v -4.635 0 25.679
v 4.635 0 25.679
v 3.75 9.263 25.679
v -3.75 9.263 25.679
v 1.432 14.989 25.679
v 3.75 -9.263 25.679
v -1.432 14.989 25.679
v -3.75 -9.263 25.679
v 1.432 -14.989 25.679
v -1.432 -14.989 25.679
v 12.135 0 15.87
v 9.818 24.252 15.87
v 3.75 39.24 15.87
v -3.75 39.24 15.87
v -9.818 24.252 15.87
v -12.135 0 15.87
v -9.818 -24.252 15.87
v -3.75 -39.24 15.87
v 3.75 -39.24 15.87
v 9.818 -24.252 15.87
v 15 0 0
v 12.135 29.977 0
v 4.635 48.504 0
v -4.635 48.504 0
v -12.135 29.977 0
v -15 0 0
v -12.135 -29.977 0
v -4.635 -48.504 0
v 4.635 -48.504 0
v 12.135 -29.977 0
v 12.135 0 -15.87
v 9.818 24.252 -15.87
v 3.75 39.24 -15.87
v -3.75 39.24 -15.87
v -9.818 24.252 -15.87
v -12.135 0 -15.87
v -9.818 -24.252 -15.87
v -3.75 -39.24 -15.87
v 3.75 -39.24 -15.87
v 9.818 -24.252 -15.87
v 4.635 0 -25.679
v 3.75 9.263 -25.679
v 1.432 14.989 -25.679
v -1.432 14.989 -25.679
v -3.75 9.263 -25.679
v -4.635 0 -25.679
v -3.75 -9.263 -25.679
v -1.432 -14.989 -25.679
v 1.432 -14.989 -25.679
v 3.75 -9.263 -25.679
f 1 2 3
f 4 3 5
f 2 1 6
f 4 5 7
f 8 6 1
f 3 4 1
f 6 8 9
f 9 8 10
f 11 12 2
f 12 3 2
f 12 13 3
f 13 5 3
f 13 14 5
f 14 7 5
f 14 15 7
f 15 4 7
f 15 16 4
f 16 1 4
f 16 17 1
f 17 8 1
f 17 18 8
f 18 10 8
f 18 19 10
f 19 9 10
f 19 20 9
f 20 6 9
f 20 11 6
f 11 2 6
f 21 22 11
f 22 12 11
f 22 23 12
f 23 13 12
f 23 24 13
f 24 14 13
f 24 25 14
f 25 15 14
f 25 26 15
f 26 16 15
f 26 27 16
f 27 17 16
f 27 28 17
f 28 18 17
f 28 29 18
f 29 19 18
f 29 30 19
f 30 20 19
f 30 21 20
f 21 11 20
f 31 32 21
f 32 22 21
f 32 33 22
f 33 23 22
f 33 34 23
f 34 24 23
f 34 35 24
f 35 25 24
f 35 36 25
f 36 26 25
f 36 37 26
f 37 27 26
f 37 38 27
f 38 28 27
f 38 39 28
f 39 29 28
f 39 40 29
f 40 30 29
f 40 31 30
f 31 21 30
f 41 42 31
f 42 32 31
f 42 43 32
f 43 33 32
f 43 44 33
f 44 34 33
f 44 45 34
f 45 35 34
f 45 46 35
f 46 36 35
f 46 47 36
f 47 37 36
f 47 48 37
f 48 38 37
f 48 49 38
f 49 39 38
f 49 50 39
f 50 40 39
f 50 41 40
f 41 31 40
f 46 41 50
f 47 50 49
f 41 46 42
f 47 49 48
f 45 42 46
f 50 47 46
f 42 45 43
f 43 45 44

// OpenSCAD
// Generated by SolidPython 1.0.1 on 2020-07-29 00:46:46


scale(v = [5, 17, 9]) {
	sphere(r = 3);
}
/***********************************************
*********      SolidPython code:      **********
************************************************
 
# import packages: SolidPython
from solid import *
from solid.utils import *
from itertools import chain, combinations, permutations


class Resize:

    def __init__(self, scad_file):
        self.scad_file = scad_file
        #self.scad_file = import_scad(scad_file)
        # cone/cylinder param:
        self.r1 = 0
        self.r2 = 0
        self.h = 0
        # rectangular prism param:
        self.w = 0
        self.l = 0
        # ellipse param:
        self.r = 0

    # import OpenScad code (file name corresponds to shape)


    # classify shape + parameters
    def assign(self, param1, param2, param3):
        if self.scad_file == 'cone.scad':
            self.r1 = param1
            self.r2 = param2
            self.h = param3
        elif self.scad_file == 'cylinder.scad':
            self.r1 = param1
            self.r2 = param2
            self.h = param3
        elif self.scad_file == 'rectangularPrism.scad':
            self.h = param1
            self.l = param2
            self.w = param3
        else:
            self.r = param1
            self.h = param2

    # resize parameters
    def iterate(self):
        x = range(3, 20, 2)
        i = 1
        if self.scad_file == 'cone.scad':
            tempList = list(permutations(x, 2))
            for temp in tempList:
                param1 = temp[0]
                param2 = temp[1]
                filepath = 'produced_scad_files/' + 'cone' + str(param1) + '_' + str(param2) + '_' + '.scad'
                scad_render_to_file(cylinder(h=param1, r1=param2, r2=0), filepath)

        elif self.scad_file == 'cylinder.scad':
            tempList = list(permutations(x, 3))
            for temp in tempList:
                param1 = temp[0]
                param2 = temp[1]
                filepath = 'produced_scad_files/' + 'cylinder' + str(param1) + '_' + str(param2) + '_' + '.scad'
                scad_render_to_file(cylinder(h=param1, r1=param2, r2=param2), filepath)

        elif self.scad_file == 'rectangularPrism.scad':
            tempList = list(permutations(x, 3))
            for temp in tempList:
                param1 = temp[0]
                param2 = temp[1]
                param3 = temp[2]
                filepath = 'produced_scad_files/' + 'rectangularPrism' + str(param1) + '_' + str(param2) + '_' + str(
                    param3) + '.scad'
                scad_render_to_file(cube(size=(param1, param2, param3)), filepath)

        elif self.scad_file == 'ellipse.scad':
            tempList = list(permutations(x, 4))
            for temp in tempList:
                param1 = temp[0]
                param2 = temp[1]
                param3 = temp[2]
                param4 = temp[3]
                filepath = 'produced_scad_files/' + 'ellipse' + str(param1) + '_' + str(param2) + '_' + str(param3) + '_' + str(param4) + '.scad'
                scad_render_to_file(scale([param1, param2, param3])(sphere(r=param4)), filepath)

    def render_to_scadfile(self):
        scad_render_to_file(scad, 'example.scad') 
 
************************************************/
